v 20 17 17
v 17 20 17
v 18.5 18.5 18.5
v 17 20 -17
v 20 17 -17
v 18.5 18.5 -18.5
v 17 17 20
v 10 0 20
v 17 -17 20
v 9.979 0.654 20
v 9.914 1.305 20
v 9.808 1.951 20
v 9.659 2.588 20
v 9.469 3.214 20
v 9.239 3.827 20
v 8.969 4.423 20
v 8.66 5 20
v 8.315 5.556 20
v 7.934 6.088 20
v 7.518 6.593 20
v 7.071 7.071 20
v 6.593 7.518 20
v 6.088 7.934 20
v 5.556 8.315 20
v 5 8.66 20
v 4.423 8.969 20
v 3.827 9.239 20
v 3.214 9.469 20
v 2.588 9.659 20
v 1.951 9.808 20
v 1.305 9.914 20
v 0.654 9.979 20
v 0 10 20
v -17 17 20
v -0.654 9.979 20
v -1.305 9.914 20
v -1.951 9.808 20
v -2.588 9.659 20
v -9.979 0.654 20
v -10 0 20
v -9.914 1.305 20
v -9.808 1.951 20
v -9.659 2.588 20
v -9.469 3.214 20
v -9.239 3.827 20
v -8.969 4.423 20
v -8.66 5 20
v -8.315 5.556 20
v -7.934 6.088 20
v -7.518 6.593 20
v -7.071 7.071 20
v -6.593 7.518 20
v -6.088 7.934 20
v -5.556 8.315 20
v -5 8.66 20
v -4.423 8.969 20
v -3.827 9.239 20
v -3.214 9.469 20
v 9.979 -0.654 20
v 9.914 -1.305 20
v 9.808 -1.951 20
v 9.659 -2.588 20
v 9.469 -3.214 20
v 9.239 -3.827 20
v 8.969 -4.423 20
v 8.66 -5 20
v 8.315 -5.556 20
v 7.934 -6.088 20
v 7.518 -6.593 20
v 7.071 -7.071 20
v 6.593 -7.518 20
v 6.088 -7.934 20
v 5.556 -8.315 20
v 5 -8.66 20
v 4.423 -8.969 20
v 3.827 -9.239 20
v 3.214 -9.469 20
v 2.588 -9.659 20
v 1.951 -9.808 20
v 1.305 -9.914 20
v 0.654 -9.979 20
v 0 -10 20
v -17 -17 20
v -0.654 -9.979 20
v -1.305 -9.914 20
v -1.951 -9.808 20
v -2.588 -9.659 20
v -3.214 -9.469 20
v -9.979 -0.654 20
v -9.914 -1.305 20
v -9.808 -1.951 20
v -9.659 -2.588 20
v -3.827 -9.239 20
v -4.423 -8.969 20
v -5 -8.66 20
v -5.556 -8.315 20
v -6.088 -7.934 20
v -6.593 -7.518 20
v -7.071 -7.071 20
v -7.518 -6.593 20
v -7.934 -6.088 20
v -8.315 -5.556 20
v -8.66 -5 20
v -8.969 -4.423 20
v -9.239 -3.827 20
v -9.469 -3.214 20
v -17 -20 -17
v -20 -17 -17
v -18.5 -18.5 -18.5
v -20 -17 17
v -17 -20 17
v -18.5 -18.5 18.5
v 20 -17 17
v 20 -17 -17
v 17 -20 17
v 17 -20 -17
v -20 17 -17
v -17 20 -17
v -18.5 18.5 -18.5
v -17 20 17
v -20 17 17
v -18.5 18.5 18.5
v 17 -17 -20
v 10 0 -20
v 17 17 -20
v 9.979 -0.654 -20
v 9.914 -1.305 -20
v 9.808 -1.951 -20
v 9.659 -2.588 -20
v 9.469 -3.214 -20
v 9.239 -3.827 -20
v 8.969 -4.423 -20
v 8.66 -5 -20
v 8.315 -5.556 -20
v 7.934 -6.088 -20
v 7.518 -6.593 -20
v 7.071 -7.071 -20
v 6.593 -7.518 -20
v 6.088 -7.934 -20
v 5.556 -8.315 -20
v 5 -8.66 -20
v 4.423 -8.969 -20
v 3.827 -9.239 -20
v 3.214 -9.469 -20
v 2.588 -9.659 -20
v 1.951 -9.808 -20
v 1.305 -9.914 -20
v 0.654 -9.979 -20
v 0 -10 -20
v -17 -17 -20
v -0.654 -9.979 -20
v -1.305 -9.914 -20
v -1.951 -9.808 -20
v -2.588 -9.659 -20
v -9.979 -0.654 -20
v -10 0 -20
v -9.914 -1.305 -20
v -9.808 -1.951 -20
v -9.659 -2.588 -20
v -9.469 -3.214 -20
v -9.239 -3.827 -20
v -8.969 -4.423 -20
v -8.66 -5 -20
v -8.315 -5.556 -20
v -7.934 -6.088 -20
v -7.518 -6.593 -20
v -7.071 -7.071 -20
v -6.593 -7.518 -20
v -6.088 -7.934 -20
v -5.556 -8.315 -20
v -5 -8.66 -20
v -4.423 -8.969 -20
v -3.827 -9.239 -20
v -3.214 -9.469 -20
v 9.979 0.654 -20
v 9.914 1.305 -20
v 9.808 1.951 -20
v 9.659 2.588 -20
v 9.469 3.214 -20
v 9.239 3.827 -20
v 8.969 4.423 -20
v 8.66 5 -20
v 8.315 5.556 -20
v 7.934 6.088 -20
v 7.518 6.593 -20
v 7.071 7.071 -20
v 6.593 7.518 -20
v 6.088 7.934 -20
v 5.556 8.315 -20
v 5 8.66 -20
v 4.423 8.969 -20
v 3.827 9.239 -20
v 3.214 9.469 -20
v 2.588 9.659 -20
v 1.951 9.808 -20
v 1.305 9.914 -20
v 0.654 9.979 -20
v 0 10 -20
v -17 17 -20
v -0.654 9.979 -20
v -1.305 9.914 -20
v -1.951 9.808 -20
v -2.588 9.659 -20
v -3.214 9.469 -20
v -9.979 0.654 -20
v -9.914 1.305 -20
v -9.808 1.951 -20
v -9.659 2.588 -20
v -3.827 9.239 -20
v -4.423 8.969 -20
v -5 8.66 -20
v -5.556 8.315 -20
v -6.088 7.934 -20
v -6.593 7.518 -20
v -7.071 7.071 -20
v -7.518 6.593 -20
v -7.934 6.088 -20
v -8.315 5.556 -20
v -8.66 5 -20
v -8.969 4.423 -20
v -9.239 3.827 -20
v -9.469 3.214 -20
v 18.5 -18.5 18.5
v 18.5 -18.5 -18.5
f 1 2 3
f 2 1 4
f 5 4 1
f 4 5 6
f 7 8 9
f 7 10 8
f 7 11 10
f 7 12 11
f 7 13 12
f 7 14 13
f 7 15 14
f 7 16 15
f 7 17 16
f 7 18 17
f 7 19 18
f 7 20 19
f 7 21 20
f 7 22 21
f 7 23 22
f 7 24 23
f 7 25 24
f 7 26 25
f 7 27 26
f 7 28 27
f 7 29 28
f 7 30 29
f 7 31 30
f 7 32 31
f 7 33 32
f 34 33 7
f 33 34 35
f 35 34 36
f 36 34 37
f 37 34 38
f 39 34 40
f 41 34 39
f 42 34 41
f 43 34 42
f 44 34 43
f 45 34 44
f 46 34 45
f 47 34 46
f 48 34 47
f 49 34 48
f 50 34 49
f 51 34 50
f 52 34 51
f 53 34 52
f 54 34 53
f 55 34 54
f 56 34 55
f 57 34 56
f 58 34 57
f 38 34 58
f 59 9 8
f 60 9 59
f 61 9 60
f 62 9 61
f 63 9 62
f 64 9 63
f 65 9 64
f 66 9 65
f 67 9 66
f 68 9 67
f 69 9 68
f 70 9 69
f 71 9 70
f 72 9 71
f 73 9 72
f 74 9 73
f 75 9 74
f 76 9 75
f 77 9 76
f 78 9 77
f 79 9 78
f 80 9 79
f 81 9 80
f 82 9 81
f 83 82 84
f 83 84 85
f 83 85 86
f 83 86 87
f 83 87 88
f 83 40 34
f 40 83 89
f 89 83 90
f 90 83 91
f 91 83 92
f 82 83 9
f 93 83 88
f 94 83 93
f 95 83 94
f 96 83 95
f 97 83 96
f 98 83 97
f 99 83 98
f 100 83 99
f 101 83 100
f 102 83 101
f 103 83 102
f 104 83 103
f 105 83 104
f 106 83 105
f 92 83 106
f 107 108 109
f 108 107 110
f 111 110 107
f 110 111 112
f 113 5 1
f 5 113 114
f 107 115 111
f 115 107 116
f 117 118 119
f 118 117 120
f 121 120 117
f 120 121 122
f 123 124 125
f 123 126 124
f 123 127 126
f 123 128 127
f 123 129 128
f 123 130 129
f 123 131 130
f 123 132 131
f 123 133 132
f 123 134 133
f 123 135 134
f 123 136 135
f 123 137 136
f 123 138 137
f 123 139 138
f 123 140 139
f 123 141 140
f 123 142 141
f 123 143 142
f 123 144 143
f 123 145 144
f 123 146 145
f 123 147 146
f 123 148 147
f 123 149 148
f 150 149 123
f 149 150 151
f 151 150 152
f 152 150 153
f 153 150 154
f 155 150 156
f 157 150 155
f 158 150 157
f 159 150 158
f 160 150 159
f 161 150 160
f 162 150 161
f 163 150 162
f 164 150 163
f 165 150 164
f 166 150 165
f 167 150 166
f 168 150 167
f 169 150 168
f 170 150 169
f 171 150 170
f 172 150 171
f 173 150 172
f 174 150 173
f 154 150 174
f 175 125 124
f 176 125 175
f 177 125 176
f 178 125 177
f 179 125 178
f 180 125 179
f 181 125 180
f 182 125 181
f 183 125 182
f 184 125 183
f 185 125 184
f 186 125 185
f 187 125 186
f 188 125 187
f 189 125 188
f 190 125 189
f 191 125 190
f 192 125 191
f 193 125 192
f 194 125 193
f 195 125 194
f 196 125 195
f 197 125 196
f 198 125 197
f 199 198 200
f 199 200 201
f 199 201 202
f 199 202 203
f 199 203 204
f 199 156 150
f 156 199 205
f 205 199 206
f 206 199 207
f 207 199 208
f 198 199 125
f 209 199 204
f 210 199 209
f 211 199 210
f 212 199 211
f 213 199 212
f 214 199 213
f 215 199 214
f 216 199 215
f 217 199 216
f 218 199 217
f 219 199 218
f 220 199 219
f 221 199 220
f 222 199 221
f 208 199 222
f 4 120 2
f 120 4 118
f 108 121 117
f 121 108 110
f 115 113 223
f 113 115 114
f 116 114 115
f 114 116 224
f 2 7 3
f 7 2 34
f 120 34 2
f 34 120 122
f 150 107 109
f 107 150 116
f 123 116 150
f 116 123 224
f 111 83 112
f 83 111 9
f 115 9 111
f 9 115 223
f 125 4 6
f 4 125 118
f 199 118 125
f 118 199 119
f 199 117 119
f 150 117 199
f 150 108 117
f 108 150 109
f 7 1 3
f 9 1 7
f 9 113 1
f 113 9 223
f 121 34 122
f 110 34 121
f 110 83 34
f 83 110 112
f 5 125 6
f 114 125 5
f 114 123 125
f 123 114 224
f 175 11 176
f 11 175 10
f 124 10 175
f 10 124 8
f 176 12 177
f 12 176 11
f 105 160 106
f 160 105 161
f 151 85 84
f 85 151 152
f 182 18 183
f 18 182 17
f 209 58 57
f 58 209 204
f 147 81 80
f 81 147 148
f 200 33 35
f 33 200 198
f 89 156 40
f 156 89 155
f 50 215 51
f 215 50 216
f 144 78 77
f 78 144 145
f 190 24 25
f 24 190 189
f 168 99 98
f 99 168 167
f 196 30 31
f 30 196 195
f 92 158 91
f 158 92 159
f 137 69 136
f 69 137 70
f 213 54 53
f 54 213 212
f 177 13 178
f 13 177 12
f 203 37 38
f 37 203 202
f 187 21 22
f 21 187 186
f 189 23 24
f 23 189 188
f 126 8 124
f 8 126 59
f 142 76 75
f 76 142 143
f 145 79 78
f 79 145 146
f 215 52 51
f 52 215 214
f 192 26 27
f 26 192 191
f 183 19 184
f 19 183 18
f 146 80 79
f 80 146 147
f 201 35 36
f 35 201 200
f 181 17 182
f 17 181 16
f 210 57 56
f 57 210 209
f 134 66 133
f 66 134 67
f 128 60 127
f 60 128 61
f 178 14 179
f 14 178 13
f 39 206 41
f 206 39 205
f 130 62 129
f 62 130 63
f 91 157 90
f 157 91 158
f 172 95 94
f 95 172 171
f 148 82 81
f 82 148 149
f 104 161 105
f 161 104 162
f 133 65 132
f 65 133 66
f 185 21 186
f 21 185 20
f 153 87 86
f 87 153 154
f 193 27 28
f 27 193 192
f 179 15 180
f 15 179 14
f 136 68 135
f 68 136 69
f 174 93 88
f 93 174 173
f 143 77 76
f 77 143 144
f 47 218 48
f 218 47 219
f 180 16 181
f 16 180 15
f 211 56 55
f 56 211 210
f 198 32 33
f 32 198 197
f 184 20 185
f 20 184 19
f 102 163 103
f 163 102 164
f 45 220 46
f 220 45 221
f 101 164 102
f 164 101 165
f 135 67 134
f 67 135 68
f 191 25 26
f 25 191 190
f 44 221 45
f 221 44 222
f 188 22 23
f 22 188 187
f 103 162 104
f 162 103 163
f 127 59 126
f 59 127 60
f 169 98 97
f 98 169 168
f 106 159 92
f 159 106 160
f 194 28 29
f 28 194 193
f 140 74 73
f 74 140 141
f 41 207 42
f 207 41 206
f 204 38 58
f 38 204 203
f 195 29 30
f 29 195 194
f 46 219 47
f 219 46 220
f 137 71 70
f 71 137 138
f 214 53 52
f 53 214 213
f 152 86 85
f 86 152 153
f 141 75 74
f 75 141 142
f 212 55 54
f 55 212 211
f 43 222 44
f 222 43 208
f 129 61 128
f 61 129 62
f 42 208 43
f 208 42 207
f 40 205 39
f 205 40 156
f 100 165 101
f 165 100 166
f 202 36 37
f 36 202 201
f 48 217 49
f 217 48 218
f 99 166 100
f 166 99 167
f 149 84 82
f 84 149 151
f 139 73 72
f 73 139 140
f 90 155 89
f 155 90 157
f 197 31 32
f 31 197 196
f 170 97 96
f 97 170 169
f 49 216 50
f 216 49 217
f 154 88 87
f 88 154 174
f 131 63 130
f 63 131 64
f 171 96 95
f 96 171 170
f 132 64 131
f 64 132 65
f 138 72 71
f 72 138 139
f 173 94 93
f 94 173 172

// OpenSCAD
// Cube with a through cylinder cutout and all 12 edges chamfered.
$fa = 2;
$fs = 0.4;

size = 40;      // cube edge length (mm)
chamfer = 3;    // 45° edge chamfer leg (mm)
bore_d = 20;    // through-bore diameter along Z (mm)

// Octagonal section: a square of side `l` with its four corners cut by `c`.
module chamfer_octagon(l, c) {
  h = l / 2;
  polygon([
    [ h,     h - c], [ h - c,  h], [-h + c,  h], [-h,     h - c],
    [-h,    -h + c], [-h + c, -h], [ h - c, -h], [ h,    -h + c]
  ]);
}

// Chamfered block = intersection of three octagonal prisms, one per axis.
// Each prism chamfers the four edges parallel to its extrusion axis.
module chamfered_block(l, c) {
  intersection() {
    linear_extrude(height = l, center = true) chamfer_octagon(l, c);
    rotate([90, 0, 90]) linear_extrude(height = l, center = true) chamfer_octagon(l, c);
    rotate([90, 0, 0]) linear_extrude(height = l, center = true) chamfer_octagon(l, c);
  }
}

module chamfered_cube_cutout() {
  difference() {
    chamfered_block(size, chamfer);
    cylinder(h = size + 2, d = bore_d, center = true, $fn = 96);
  }
}

chamfered_cube_cutout();
